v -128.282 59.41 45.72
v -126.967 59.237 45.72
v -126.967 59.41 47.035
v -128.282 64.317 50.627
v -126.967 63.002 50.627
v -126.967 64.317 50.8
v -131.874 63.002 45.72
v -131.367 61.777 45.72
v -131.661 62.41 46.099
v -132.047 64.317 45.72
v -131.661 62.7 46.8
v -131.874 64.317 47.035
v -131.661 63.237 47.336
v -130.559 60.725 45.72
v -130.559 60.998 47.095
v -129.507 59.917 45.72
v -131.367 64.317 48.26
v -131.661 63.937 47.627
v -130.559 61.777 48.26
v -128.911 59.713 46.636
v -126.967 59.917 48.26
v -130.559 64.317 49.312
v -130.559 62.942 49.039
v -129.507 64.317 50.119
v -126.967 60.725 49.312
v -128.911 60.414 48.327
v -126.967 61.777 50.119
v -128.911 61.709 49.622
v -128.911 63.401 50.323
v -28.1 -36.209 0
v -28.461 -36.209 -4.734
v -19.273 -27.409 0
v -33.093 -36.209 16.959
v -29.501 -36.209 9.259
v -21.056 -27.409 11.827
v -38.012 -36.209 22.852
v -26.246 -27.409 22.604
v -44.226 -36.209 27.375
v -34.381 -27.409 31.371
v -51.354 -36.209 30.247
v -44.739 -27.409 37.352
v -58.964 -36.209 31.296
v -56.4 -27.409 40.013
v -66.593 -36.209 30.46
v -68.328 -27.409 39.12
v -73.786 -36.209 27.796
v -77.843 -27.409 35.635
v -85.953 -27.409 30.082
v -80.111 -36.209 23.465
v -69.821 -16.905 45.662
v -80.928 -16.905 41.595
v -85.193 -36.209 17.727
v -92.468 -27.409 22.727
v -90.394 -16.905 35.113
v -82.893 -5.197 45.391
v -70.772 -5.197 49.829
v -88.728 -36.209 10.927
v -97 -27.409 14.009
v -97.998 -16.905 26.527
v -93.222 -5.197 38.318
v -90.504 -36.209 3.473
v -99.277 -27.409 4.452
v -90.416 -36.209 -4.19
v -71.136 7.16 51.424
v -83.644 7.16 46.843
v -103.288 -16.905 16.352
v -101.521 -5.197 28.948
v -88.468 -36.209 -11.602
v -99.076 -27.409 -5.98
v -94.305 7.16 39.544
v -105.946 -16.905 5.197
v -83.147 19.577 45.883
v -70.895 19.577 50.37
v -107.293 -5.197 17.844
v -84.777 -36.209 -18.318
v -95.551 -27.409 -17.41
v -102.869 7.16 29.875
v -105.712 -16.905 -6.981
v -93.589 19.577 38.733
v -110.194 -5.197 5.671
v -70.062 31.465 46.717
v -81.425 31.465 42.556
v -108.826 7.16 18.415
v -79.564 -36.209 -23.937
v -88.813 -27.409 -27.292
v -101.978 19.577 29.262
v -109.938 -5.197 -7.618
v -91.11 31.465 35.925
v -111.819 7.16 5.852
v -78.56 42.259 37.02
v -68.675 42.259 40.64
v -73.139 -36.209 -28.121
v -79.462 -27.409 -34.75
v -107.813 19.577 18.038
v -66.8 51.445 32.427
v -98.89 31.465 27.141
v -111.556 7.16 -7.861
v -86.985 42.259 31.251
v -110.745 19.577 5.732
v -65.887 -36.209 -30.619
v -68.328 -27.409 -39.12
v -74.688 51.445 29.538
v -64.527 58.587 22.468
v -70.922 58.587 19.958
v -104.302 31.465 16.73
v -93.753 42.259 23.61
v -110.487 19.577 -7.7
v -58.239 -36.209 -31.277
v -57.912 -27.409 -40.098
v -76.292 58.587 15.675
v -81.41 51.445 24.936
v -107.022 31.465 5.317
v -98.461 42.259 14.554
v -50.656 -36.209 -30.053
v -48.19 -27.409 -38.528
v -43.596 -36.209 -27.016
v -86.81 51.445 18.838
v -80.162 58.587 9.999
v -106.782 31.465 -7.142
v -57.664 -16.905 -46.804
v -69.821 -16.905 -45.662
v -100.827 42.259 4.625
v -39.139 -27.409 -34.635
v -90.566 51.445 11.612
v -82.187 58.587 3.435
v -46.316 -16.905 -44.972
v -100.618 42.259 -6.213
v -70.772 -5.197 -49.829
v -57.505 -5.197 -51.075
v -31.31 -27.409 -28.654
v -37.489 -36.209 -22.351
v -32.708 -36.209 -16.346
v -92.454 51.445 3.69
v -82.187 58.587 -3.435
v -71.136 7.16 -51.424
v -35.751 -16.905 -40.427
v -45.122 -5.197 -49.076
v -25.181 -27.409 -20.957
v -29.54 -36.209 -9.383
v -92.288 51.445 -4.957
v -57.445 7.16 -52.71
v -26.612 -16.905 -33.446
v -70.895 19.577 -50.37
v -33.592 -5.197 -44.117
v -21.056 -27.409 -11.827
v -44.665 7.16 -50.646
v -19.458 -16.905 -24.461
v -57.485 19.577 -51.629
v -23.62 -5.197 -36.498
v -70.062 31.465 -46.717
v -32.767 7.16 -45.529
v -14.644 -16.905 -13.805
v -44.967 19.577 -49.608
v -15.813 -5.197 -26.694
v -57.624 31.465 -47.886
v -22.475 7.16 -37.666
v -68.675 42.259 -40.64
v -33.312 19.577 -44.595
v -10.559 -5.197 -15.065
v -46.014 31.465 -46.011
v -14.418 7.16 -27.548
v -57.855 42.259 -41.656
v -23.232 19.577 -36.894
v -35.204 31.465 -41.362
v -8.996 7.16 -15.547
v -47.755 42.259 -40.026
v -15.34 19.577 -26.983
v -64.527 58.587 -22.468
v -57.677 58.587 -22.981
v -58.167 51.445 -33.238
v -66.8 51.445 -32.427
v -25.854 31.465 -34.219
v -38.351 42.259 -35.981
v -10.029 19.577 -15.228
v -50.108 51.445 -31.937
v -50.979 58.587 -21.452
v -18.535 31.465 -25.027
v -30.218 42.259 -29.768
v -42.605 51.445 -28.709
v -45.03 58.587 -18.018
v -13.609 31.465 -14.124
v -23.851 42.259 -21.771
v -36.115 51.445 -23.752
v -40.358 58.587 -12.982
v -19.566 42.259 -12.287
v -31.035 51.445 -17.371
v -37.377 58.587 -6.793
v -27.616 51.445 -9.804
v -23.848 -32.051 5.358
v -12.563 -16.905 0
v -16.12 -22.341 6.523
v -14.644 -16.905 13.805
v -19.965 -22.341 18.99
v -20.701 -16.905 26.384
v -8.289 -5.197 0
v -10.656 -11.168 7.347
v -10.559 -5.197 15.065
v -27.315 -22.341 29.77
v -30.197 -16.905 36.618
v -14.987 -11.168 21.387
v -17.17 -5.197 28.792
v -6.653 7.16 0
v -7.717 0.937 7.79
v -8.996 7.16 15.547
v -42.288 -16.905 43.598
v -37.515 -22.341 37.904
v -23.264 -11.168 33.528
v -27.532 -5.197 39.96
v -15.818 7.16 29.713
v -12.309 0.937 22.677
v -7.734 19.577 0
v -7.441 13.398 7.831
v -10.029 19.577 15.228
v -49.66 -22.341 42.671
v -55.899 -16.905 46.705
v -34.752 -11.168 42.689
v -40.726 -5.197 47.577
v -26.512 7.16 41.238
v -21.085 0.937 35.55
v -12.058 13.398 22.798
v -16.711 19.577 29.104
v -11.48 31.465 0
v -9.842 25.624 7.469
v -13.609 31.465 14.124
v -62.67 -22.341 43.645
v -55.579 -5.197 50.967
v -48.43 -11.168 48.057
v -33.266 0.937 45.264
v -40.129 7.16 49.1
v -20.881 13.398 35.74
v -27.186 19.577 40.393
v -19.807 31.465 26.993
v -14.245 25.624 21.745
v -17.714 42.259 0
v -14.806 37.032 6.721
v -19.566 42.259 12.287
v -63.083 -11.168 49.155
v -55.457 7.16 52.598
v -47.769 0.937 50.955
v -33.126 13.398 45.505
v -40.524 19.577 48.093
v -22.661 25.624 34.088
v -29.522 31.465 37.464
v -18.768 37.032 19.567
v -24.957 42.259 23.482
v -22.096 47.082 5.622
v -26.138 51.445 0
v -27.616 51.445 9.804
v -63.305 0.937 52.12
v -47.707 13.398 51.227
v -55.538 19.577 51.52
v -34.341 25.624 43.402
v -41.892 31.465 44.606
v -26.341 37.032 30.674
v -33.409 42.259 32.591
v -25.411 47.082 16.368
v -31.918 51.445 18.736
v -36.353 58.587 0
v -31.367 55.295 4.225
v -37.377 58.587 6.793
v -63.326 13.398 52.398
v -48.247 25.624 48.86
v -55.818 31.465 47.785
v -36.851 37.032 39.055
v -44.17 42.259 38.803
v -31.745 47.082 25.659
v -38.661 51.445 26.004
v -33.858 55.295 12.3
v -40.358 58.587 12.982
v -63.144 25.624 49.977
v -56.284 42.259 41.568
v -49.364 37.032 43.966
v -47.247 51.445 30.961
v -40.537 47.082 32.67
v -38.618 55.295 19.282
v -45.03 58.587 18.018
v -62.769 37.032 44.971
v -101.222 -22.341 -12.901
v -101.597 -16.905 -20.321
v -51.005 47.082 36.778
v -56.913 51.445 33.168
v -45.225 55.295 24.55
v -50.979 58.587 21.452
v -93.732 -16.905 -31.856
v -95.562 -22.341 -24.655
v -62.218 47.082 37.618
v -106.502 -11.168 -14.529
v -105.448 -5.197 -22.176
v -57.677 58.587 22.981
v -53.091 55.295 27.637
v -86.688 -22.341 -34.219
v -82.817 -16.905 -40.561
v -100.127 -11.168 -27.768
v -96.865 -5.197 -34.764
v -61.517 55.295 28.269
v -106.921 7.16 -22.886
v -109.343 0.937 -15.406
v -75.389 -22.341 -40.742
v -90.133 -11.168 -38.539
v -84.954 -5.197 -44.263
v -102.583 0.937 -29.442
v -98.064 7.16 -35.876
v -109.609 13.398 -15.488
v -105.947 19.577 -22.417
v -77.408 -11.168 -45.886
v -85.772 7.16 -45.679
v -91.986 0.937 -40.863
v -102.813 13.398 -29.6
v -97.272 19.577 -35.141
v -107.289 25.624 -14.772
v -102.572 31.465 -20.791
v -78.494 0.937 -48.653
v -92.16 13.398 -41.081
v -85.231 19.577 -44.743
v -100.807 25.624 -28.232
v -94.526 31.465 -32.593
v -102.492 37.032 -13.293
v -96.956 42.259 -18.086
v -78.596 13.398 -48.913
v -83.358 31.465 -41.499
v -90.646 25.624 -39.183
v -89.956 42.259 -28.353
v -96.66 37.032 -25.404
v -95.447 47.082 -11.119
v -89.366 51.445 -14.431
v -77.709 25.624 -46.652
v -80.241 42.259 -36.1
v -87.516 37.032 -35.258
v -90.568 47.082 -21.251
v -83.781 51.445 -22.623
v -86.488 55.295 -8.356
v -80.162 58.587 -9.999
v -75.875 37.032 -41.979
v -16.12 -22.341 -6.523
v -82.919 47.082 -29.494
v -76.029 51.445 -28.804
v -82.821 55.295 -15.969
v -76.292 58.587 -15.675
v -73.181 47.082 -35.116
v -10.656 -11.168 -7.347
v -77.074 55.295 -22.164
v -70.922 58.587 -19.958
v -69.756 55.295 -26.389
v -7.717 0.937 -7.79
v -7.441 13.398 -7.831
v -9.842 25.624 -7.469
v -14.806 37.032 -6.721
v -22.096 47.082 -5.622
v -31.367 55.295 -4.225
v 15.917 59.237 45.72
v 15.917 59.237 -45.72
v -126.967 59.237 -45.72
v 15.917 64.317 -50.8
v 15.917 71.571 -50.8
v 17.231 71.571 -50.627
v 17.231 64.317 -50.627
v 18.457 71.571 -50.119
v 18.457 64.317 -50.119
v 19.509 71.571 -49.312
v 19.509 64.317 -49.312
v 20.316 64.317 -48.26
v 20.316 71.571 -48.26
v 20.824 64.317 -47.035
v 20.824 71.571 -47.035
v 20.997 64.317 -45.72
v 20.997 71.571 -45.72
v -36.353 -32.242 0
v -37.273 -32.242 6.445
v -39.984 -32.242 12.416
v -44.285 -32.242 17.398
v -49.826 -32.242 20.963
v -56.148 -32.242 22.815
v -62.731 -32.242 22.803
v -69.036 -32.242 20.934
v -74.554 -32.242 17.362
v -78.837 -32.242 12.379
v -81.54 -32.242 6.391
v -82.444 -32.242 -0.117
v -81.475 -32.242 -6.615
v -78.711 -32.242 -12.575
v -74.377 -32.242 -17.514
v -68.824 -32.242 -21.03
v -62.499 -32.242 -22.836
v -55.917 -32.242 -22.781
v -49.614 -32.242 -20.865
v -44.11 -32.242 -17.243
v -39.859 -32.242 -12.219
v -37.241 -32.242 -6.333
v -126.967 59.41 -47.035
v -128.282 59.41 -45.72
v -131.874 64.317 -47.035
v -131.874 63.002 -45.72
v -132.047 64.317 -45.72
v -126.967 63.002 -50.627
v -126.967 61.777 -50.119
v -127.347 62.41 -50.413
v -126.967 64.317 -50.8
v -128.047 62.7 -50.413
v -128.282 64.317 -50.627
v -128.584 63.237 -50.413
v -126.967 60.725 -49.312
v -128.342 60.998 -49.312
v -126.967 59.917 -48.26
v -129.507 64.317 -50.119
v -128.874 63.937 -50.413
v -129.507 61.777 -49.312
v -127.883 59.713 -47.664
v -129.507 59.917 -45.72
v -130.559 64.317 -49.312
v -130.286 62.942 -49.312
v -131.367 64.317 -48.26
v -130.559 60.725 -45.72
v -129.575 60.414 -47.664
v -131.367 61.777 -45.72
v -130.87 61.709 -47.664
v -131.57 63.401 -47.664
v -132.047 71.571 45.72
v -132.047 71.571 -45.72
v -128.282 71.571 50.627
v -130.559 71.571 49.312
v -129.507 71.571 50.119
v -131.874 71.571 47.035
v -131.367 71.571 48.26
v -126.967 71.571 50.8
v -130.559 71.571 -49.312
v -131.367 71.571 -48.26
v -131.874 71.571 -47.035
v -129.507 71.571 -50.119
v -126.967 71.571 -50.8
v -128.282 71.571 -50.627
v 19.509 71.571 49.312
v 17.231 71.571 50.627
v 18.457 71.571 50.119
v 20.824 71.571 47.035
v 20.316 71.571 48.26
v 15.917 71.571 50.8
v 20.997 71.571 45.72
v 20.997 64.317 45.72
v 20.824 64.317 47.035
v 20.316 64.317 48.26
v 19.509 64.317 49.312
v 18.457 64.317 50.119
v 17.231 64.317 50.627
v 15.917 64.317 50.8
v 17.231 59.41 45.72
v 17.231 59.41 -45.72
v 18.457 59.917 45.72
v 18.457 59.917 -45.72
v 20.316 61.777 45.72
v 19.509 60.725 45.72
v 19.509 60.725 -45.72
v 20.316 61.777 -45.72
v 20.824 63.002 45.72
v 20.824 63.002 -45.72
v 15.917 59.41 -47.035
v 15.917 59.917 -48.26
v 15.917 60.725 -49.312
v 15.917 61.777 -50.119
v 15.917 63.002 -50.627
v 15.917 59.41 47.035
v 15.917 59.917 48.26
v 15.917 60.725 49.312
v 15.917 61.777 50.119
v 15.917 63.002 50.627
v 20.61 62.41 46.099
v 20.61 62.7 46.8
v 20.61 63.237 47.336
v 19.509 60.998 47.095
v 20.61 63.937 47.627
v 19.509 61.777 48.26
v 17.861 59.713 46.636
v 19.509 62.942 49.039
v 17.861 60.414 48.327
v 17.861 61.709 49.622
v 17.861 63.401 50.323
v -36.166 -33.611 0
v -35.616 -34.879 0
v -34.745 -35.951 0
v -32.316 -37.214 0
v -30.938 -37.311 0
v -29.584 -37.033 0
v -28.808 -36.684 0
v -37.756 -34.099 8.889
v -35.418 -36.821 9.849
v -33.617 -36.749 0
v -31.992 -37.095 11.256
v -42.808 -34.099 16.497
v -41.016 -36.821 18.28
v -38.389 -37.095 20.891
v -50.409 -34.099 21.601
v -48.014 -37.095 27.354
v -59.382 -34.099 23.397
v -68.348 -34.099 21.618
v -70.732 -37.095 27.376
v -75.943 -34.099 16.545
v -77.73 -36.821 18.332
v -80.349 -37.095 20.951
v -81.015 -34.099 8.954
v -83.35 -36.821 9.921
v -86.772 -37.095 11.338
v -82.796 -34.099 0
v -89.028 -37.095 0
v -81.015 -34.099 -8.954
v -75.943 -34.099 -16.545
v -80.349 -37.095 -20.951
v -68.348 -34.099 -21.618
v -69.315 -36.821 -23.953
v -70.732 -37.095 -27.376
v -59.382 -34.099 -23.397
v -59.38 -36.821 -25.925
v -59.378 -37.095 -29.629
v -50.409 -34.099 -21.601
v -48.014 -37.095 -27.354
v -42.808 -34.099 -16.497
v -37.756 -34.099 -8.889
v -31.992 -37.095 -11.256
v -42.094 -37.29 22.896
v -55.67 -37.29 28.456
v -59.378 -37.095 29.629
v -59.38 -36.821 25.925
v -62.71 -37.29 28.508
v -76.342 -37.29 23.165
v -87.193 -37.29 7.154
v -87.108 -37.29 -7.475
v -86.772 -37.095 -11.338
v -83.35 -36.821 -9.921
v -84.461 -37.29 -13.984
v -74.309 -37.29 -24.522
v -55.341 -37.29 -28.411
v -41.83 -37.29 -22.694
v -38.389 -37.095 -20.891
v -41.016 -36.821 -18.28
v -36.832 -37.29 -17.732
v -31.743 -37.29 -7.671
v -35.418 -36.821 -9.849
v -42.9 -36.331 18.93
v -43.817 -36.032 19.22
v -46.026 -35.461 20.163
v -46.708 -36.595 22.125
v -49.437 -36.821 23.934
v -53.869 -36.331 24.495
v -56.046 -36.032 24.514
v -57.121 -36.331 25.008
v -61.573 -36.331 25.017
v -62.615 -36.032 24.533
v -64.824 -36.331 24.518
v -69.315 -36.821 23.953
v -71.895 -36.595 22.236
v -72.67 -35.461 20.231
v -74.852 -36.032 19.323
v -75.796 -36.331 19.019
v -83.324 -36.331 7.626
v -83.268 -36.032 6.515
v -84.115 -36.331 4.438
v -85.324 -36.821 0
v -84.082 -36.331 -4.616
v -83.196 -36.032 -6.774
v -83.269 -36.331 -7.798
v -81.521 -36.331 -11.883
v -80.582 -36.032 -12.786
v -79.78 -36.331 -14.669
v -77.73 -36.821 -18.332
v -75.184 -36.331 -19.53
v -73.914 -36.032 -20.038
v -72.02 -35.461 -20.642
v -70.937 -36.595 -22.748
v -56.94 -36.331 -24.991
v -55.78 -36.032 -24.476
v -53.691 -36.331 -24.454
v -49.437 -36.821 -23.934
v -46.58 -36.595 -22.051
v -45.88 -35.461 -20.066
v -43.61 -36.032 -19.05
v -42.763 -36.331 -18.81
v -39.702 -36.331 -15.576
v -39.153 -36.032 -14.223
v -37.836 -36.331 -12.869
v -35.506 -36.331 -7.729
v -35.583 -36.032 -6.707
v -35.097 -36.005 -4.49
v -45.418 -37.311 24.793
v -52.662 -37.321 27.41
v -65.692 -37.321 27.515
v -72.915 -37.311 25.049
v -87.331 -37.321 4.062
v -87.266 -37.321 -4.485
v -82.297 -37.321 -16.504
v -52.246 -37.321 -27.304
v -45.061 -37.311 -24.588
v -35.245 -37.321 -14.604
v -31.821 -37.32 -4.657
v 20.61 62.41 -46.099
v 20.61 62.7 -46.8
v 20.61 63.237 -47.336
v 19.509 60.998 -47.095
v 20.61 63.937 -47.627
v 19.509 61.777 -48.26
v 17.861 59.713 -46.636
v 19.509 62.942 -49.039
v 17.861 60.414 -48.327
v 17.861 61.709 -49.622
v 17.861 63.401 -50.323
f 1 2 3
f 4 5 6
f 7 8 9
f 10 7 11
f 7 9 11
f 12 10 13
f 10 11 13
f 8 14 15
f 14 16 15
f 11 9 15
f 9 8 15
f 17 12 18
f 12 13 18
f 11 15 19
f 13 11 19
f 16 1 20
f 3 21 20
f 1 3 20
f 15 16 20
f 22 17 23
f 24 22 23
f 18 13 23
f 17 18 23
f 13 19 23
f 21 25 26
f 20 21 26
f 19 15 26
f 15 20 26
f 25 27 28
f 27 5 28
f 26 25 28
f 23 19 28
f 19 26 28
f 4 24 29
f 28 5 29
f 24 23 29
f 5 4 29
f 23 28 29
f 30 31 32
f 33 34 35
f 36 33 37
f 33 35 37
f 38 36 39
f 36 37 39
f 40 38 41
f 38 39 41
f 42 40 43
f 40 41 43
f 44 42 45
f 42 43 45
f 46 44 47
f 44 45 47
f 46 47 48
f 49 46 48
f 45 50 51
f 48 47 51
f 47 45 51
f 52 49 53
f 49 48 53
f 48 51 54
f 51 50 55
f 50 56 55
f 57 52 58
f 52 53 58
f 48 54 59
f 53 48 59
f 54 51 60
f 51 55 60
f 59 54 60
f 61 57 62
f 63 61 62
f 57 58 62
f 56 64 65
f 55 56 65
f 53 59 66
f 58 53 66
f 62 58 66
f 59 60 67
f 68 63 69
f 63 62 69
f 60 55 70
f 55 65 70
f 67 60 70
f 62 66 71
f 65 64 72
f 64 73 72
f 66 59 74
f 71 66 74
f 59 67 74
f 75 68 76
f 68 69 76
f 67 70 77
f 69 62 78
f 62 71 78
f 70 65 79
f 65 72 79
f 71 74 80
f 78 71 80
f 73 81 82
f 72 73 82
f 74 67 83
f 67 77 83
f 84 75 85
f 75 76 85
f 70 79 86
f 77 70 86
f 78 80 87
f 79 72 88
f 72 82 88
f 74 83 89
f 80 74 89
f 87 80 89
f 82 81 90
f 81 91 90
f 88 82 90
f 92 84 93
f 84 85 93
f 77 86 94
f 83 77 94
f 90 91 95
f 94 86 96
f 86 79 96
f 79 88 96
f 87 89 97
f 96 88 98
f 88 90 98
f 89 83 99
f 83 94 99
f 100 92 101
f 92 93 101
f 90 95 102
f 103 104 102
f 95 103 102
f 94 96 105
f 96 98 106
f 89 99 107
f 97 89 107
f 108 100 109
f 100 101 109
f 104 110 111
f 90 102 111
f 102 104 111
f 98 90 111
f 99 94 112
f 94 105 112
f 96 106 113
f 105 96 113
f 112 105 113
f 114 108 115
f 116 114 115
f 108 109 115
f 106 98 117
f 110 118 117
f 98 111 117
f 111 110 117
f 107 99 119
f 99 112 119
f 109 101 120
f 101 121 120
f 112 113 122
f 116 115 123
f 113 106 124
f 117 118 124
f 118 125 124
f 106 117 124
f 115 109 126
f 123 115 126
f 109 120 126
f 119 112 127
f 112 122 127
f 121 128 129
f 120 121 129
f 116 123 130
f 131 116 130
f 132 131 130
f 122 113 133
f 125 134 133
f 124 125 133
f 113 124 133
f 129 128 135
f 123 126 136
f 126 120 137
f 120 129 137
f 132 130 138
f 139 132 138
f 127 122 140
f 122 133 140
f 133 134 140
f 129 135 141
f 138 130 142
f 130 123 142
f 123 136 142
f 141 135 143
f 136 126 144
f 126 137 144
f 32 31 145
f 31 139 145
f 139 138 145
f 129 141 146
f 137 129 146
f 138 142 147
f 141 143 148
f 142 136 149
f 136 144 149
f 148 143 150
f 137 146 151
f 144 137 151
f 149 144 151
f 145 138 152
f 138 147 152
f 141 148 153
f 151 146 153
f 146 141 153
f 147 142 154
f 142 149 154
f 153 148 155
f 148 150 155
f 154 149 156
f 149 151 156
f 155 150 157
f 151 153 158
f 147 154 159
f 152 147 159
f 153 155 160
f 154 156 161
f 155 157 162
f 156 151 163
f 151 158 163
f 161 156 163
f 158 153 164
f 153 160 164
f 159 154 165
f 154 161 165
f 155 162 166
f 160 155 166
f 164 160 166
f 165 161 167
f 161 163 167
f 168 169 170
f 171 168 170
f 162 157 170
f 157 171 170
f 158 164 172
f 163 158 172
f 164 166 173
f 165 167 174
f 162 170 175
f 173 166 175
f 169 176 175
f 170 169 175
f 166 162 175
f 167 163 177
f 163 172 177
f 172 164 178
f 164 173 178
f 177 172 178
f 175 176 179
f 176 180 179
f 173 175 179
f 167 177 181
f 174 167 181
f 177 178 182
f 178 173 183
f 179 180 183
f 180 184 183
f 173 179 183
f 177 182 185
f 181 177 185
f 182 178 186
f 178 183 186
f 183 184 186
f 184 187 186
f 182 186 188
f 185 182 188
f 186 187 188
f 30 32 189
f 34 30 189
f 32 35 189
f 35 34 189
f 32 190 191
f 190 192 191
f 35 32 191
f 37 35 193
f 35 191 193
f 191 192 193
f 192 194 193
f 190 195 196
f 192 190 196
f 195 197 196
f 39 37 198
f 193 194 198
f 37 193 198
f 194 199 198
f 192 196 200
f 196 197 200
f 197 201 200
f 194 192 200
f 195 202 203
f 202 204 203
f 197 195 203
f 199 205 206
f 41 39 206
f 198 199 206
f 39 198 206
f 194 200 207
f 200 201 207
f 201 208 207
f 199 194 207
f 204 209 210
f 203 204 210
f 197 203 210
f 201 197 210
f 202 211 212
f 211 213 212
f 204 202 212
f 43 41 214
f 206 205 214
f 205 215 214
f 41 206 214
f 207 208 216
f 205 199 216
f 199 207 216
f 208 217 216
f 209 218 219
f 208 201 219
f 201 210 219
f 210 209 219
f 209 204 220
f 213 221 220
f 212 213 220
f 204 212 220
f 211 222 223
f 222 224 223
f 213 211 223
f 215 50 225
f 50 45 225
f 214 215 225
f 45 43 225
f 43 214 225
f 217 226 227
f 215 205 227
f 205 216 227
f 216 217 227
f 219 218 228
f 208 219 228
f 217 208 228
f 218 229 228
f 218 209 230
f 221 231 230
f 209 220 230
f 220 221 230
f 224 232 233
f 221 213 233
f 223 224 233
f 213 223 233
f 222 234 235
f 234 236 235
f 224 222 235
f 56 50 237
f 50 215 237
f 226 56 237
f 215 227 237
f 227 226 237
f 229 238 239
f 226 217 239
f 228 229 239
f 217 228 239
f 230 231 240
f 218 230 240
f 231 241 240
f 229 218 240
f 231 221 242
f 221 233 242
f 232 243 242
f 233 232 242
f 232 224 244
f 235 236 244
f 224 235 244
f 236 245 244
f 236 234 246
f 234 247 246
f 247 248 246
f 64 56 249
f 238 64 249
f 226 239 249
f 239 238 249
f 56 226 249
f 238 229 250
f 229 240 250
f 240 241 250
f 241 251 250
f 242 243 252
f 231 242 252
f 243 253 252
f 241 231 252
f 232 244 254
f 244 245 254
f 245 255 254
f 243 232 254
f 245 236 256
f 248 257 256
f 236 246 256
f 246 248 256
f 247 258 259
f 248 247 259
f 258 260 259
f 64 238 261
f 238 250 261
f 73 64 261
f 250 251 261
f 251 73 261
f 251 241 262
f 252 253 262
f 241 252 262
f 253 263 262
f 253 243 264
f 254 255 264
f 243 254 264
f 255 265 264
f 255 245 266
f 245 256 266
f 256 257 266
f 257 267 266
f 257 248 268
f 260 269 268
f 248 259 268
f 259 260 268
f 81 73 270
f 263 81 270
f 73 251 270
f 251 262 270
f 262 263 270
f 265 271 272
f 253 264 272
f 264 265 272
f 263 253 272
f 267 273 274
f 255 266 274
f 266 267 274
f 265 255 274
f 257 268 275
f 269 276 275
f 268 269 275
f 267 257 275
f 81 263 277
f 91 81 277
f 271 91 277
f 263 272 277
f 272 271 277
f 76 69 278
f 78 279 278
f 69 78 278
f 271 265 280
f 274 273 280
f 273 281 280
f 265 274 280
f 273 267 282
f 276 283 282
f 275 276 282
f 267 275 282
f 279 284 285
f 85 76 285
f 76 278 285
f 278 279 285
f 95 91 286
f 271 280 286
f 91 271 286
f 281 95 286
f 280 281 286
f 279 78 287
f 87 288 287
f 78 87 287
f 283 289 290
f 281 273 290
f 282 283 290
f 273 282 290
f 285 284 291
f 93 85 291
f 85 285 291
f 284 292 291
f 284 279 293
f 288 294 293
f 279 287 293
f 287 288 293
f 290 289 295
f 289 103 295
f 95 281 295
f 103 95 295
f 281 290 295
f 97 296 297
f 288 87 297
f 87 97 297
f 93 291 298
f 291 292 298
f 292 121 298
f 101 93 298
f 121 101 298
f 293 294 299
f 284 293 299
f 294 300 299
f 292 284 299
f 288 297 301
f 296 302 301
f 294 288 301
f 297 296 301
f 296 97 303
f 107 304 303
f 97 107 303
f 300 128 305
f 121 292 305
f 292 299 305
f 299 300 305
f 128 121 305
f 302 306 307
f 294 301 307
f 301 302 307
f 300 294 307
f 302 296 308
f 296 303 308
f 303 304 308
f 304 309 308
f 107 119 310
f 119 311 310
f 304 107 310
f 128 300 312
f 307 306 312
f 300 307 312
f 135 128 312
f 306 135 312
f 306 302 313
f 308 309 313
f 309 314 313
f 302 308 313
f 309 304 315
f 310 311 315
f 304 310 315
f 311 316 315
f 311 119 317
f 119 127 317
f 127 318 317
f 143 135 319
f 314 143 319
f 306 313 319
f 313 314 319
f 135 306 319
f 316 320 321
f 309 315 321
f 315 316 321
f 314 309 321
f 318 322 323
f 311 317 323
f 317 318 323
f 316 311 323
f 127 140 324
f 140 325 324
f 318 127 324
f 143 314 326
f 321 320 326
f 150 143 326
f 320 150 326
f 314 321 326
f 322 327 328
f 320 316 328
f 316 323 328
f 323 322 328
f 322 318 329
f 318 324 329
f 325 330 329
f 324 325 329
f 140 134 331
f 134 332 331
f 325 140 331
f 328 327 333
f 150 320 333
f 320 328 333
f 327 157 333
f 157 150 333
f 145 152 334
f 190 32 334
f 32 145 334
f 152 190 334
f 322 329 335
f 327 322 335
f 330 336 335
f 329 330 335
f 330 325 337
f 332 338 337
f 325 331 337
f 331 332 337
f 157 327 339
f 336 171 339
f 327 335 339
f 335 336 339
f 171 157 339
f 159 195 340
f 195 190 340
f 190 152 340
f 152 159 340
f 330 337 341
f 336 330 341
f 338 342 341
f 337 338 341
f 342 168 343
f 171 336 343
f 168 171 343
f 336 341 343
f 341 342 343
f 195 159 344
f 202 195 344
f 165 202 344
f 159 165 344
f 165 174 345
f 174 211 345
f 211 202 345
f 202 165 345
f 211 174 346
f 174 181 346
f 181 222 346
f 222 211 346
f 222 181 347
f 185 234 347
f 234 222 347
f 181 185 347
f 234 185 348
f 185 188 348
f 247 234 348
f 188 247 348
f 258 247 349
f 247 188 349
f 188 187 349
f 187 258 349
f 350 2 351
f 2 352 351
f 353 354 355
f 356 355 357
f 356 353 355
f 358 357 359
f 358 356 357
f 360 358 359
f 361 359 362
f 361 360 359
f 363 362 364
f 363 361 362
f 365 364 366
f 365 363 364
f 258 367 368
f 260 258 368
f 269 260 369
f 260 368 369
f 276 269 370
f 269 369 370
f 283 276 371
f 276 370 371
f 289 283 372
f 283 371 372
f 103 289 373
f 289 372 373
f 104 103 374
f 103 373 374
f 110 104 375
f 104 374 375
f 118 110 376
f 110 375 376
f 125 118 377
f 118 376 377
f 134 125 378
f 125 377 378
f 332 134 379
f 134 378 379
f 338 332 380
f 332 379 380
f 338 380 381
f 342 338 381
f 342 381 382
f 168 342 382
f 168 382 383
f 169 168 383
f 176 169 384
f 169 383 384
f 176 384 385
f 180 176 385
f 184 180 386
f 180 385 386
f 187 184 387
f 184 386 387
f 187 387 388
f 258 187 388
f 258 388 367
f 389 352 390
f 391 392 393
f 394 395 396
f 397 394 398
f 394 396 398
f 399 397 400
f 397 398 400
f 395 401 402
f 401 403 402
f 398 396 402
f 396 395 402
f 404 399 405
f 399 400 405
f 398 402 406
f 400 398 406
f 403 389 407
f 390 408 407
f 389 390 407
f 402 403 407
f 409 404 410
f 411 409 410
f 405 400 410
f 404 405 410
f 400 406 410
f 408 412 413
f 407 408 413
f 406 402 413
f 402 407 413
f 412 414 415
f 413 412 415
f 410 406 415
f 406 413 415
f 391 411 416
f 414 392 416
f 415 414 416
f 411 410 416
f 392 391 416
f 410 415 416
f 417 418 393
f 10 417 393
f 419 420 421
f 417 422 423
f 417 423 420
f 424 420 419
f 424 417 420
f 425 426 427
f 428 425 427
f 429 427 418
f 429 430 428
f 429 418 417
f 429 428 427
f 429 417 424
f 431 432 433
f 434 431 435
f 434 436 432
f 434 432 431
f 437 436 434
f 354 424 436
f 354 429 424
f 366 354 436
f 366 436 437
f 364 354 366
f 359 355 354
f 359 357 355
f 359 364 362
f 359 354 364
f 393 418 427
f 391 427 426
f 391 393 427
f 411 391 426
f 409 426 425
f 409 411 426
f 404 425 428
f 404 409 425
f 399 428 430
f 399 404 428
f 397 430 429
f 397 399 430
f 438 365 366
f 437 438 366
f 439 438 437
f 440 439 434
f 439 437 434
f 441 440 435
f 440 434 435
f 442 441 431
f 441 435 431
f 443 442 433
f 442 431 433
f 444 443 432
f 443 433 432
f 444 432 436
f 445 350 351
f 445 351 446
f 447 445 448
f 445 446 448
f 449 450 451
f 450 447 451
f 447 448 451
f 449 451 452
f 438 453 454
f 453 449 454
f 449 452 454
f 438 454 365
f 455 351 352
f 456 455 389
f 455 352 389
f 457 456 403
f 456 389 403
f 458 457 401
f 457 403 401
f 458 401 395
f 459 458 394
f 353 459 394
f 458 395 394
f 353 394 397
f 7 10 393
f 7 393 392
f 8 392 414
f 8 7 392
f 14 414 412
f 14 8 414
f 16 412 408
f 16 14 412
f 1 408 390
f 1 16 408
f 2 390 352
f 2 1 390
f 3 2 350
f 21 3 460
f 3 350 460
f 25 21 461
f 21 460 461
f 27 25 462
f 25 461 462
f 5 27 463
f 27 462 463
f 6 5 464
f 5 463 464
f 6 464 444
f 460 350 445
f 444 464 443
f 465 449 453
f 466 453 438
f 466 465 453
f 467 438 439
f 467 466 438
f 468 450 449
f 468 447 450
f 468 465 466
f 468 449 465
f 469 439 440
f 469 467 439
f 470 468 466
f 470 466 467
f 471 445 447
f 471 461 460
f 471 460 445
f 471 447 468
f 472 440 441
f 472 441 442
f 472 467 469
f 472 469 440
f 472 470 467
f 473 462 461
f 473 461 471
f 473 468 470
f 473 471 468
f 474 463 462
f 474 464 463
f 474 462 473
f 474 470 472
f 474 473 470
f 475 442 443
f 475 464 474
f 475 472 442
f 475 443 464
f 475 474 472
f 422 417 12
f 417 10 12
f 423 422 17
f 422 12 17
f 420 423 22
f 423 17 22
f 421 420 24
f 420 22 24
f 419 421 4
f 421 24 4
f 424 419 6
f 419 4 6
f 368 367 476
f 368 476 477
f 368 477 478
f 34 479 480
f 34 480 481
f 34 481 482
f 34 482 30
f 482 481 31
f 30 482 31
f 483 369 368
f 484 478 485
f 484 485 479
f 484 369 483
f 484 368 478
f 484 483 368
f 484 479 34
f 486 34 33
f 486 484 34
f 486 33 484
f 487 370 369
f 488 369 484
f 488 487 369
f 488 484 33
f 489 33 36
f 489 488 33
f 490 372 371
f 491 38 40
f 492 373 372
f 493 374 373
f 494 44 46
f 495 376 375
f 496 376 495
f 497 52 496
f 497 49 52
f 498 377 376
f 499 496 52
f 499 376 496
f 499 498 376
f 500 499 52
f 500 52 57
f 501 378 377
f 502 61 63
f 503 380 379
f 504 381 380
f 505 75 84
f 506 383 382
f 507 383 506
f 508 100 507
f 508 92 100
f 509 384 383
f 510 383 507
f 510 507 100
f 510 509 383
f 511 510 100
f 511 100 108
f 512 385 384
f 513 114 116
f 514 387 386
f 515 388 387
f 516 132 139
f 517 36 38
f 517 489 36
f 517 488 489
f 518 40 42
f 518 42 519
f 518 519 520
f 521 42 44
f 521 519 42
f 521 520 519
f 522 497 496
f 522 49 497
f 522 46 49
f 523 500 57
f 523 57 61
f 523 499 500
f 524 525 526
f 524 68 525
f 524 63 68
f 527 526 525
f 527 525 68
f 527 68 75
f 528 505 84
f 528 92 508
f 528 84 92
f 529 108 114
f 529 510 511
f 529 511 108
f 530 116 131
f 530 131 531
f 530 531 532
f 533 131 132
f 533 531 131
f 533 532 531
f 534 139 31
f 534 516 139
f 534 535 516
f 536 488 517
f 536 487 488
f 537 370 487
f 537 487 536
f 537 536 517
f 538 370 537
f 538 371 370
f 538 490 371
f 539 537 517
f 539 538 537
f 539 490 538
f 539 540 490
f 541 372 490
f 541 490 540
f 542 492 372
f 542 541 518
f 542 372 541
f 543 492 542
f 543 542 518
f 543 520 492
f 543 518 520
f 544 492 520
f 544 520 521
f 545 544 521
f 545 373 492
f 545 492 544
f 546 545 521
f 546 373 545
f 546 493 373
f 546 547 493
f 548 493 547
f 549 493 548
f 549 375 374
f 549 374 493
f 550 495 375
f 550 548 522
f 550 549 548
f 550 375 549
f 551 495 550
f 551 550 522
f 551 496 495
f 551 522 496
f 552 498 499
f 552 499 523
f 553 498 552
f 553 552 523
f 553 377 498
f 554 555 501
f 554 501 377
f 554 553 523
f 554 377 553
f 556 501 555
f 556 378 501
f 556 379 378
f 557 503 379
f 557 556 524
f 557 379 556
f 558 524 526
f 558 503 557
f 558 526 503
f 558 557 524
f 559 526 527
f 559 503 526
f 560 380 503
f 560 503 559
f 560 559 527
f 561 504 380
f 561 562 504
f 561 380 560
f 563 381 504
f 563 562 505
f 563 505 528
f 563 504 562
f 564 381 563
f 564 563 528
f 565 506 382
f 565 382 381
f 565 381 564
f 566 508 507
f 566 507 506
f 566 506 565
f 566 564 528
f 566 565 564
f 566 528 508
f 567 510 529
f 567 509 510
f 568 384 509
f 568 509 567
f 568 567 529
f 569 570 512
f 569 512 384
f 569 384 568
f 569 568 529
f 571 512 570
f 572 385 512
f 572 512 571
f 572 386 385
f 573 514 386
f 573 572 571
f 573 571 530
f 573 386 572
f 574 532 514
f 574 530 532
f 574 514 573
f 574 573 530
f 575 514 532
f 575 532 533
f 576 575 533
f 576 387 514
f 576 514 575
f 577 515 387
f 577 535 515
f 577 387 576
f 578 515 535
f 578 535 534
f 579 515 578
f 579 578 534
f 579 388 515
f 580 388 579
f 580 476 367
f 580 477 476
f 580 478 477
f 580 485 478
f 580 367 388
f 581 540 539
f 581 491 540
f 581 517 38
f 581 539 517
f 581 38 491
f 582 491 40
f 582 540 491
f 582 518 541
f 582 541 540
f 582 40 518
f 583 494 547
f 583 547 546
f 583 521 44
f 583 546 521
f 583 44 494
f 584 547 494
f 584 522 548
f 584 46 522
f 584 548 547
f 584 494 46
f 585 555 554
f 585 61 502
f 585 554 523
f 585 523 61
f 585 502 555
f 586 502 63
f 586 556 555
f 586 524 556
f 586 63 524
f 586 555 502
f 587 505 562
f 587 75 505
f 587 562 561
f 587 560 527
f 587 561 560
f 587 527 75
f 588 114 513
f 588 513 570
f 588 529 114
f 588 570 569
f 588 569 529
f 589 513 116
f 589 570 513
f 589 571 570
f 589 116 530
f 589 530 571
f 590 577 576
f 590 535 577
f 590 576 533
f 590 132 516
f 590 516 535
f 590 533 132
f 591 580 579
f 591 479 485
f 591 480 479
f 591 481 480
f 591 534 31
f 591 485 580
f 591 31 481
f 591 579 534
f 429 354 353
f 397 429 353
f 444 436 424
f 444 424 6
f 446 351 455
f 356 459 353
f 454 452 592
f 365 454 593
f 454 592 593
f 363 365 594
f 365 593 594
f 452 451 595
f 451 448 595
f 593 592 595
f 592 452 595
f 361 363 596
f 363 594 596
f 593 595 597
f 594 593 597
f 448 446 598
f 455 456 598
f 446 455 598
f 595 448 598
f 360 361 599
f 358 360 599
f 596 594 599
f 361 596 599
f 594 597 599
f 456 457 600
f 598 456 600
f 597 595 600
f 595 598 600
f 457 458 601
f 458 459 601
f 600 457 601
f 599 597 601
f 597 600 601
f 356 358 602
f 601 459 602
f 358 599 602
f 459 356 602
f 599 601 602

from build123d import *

# Parameters (mm, degrees)
F3_W      = 102.244021371
F3_H      = 12.3342014849
F4_DEPTH  = 25.4
F5_W      = 102.244021371
F5_H      = 12.3342014849
F6_DEPTH  = 25.4
F7_W      = 12.3342014849
F7_H      = 50.8
F8_DEPTH  = 25.4
F9_DEPTH  = 25.4
F10_DEPTH = 25.4
F11_DEPTH = 25.4
F12_R     = 5.08
F13_R     = 5.08


with BuildPart() as f2:
    # F1 (on face) → F2 (revolve)
    with BuildSketch(Plane.XY):
        with BuildLine():
            Line((-36.3534279168, 58.5874468088), (-36.3534279168, -41.7090654373))
            ThreePointArc((-36.3534279168, -41.7090654373), (-6.6386303364, 8.4391906857), (-36.3534279168, 58.5874468088))
        make_face()
    revolve(axis=Axis((-59.3989044428, 8.4391906857, 0), (0, -1, 0)))

    # F13
    f13_edges = [f2.edges().sort_by_distance(p)[0] for p in [
        (-82.444381, -41.709065, 0),
    ]]
    fillet(f13_edges, radius=F13_R)


with BuildPart() as f4:
    # F3 (on Top) → F4 (new body)
    with BuildSketch(Plane.XY):
        with Locations((-30.125326477, 65.4037129134)):
            Rectangle(F3_W, F3_H)
    extrude(amount=F4_DEPTH)

    # F5 (on face) → F6 (join)
    with BuildSketch(Plane(origin=(0, 0, 0), x_dir=(1, 0, 0), z_dir=(0, 0, -1))):
        with Locations((-30.125326477, -65.4037129134)):
            Rectangle(F5_W, F5_H)
    extrude(amount=F6_DEPTH)

    # F7 (on face) → F8 (join)
    with BuildSketch(Plane(origin=(-81.2473371625, 0, 0), x_dir=(0, -1, 0), z_dir=(-1, 0, 0))):
        with Locations((-65.4037129134, 0)):
            Rectangle(F7_W, F7_H)
    extrude(amount=F8_DEPTH)

    # F9 (add): a face of the model
    f9_faces = [f4.faces().sort_by_distance(p)[0] for p in [
        (-106.6473371625, 65.4037129134, 0),
    ]]
    extrude(f9_faces, amount=F9_DEPTH)

    # F10 (add): a face of the model
    f10_faces = [f4.faces().sort_by_distance(p)[0] for p in [
        (-55.525326477, 65.4037129134, -25.4),
    ]]
    extrude(f10_faces, amount=F10_DEPTH)

    # F11 (add): a face of the model
    f11_faces = [f4.faces().sort_by_distance(p)[0] for p in [
        (-55.525326477, 65.4037129134, 25.4),
    ]]
    extrude(f11_faces, amount=F11_DEPTH)

    # F12
    f12_edges = [f4.edges().sort_by_distance(p)[0] for p in [
        (-55.525326, 59.236612, 50.8),
        (-132.047337, 59.236612, 0),
        (-55.525326, 59.236612, -50.8),
        (20.996684, 59.236612, 0),
        (20.996684, 65.403713, -50.8),
        (-132.047337, 65.403713, -50.8),
        (20.996684, 65.403713, 50.8),
        (-132.047337, 65.403713, 50.8),
    ]]
    fillet(f12_edges, radius=F12_R)


solid = Compound([f2.part, f4.part])
